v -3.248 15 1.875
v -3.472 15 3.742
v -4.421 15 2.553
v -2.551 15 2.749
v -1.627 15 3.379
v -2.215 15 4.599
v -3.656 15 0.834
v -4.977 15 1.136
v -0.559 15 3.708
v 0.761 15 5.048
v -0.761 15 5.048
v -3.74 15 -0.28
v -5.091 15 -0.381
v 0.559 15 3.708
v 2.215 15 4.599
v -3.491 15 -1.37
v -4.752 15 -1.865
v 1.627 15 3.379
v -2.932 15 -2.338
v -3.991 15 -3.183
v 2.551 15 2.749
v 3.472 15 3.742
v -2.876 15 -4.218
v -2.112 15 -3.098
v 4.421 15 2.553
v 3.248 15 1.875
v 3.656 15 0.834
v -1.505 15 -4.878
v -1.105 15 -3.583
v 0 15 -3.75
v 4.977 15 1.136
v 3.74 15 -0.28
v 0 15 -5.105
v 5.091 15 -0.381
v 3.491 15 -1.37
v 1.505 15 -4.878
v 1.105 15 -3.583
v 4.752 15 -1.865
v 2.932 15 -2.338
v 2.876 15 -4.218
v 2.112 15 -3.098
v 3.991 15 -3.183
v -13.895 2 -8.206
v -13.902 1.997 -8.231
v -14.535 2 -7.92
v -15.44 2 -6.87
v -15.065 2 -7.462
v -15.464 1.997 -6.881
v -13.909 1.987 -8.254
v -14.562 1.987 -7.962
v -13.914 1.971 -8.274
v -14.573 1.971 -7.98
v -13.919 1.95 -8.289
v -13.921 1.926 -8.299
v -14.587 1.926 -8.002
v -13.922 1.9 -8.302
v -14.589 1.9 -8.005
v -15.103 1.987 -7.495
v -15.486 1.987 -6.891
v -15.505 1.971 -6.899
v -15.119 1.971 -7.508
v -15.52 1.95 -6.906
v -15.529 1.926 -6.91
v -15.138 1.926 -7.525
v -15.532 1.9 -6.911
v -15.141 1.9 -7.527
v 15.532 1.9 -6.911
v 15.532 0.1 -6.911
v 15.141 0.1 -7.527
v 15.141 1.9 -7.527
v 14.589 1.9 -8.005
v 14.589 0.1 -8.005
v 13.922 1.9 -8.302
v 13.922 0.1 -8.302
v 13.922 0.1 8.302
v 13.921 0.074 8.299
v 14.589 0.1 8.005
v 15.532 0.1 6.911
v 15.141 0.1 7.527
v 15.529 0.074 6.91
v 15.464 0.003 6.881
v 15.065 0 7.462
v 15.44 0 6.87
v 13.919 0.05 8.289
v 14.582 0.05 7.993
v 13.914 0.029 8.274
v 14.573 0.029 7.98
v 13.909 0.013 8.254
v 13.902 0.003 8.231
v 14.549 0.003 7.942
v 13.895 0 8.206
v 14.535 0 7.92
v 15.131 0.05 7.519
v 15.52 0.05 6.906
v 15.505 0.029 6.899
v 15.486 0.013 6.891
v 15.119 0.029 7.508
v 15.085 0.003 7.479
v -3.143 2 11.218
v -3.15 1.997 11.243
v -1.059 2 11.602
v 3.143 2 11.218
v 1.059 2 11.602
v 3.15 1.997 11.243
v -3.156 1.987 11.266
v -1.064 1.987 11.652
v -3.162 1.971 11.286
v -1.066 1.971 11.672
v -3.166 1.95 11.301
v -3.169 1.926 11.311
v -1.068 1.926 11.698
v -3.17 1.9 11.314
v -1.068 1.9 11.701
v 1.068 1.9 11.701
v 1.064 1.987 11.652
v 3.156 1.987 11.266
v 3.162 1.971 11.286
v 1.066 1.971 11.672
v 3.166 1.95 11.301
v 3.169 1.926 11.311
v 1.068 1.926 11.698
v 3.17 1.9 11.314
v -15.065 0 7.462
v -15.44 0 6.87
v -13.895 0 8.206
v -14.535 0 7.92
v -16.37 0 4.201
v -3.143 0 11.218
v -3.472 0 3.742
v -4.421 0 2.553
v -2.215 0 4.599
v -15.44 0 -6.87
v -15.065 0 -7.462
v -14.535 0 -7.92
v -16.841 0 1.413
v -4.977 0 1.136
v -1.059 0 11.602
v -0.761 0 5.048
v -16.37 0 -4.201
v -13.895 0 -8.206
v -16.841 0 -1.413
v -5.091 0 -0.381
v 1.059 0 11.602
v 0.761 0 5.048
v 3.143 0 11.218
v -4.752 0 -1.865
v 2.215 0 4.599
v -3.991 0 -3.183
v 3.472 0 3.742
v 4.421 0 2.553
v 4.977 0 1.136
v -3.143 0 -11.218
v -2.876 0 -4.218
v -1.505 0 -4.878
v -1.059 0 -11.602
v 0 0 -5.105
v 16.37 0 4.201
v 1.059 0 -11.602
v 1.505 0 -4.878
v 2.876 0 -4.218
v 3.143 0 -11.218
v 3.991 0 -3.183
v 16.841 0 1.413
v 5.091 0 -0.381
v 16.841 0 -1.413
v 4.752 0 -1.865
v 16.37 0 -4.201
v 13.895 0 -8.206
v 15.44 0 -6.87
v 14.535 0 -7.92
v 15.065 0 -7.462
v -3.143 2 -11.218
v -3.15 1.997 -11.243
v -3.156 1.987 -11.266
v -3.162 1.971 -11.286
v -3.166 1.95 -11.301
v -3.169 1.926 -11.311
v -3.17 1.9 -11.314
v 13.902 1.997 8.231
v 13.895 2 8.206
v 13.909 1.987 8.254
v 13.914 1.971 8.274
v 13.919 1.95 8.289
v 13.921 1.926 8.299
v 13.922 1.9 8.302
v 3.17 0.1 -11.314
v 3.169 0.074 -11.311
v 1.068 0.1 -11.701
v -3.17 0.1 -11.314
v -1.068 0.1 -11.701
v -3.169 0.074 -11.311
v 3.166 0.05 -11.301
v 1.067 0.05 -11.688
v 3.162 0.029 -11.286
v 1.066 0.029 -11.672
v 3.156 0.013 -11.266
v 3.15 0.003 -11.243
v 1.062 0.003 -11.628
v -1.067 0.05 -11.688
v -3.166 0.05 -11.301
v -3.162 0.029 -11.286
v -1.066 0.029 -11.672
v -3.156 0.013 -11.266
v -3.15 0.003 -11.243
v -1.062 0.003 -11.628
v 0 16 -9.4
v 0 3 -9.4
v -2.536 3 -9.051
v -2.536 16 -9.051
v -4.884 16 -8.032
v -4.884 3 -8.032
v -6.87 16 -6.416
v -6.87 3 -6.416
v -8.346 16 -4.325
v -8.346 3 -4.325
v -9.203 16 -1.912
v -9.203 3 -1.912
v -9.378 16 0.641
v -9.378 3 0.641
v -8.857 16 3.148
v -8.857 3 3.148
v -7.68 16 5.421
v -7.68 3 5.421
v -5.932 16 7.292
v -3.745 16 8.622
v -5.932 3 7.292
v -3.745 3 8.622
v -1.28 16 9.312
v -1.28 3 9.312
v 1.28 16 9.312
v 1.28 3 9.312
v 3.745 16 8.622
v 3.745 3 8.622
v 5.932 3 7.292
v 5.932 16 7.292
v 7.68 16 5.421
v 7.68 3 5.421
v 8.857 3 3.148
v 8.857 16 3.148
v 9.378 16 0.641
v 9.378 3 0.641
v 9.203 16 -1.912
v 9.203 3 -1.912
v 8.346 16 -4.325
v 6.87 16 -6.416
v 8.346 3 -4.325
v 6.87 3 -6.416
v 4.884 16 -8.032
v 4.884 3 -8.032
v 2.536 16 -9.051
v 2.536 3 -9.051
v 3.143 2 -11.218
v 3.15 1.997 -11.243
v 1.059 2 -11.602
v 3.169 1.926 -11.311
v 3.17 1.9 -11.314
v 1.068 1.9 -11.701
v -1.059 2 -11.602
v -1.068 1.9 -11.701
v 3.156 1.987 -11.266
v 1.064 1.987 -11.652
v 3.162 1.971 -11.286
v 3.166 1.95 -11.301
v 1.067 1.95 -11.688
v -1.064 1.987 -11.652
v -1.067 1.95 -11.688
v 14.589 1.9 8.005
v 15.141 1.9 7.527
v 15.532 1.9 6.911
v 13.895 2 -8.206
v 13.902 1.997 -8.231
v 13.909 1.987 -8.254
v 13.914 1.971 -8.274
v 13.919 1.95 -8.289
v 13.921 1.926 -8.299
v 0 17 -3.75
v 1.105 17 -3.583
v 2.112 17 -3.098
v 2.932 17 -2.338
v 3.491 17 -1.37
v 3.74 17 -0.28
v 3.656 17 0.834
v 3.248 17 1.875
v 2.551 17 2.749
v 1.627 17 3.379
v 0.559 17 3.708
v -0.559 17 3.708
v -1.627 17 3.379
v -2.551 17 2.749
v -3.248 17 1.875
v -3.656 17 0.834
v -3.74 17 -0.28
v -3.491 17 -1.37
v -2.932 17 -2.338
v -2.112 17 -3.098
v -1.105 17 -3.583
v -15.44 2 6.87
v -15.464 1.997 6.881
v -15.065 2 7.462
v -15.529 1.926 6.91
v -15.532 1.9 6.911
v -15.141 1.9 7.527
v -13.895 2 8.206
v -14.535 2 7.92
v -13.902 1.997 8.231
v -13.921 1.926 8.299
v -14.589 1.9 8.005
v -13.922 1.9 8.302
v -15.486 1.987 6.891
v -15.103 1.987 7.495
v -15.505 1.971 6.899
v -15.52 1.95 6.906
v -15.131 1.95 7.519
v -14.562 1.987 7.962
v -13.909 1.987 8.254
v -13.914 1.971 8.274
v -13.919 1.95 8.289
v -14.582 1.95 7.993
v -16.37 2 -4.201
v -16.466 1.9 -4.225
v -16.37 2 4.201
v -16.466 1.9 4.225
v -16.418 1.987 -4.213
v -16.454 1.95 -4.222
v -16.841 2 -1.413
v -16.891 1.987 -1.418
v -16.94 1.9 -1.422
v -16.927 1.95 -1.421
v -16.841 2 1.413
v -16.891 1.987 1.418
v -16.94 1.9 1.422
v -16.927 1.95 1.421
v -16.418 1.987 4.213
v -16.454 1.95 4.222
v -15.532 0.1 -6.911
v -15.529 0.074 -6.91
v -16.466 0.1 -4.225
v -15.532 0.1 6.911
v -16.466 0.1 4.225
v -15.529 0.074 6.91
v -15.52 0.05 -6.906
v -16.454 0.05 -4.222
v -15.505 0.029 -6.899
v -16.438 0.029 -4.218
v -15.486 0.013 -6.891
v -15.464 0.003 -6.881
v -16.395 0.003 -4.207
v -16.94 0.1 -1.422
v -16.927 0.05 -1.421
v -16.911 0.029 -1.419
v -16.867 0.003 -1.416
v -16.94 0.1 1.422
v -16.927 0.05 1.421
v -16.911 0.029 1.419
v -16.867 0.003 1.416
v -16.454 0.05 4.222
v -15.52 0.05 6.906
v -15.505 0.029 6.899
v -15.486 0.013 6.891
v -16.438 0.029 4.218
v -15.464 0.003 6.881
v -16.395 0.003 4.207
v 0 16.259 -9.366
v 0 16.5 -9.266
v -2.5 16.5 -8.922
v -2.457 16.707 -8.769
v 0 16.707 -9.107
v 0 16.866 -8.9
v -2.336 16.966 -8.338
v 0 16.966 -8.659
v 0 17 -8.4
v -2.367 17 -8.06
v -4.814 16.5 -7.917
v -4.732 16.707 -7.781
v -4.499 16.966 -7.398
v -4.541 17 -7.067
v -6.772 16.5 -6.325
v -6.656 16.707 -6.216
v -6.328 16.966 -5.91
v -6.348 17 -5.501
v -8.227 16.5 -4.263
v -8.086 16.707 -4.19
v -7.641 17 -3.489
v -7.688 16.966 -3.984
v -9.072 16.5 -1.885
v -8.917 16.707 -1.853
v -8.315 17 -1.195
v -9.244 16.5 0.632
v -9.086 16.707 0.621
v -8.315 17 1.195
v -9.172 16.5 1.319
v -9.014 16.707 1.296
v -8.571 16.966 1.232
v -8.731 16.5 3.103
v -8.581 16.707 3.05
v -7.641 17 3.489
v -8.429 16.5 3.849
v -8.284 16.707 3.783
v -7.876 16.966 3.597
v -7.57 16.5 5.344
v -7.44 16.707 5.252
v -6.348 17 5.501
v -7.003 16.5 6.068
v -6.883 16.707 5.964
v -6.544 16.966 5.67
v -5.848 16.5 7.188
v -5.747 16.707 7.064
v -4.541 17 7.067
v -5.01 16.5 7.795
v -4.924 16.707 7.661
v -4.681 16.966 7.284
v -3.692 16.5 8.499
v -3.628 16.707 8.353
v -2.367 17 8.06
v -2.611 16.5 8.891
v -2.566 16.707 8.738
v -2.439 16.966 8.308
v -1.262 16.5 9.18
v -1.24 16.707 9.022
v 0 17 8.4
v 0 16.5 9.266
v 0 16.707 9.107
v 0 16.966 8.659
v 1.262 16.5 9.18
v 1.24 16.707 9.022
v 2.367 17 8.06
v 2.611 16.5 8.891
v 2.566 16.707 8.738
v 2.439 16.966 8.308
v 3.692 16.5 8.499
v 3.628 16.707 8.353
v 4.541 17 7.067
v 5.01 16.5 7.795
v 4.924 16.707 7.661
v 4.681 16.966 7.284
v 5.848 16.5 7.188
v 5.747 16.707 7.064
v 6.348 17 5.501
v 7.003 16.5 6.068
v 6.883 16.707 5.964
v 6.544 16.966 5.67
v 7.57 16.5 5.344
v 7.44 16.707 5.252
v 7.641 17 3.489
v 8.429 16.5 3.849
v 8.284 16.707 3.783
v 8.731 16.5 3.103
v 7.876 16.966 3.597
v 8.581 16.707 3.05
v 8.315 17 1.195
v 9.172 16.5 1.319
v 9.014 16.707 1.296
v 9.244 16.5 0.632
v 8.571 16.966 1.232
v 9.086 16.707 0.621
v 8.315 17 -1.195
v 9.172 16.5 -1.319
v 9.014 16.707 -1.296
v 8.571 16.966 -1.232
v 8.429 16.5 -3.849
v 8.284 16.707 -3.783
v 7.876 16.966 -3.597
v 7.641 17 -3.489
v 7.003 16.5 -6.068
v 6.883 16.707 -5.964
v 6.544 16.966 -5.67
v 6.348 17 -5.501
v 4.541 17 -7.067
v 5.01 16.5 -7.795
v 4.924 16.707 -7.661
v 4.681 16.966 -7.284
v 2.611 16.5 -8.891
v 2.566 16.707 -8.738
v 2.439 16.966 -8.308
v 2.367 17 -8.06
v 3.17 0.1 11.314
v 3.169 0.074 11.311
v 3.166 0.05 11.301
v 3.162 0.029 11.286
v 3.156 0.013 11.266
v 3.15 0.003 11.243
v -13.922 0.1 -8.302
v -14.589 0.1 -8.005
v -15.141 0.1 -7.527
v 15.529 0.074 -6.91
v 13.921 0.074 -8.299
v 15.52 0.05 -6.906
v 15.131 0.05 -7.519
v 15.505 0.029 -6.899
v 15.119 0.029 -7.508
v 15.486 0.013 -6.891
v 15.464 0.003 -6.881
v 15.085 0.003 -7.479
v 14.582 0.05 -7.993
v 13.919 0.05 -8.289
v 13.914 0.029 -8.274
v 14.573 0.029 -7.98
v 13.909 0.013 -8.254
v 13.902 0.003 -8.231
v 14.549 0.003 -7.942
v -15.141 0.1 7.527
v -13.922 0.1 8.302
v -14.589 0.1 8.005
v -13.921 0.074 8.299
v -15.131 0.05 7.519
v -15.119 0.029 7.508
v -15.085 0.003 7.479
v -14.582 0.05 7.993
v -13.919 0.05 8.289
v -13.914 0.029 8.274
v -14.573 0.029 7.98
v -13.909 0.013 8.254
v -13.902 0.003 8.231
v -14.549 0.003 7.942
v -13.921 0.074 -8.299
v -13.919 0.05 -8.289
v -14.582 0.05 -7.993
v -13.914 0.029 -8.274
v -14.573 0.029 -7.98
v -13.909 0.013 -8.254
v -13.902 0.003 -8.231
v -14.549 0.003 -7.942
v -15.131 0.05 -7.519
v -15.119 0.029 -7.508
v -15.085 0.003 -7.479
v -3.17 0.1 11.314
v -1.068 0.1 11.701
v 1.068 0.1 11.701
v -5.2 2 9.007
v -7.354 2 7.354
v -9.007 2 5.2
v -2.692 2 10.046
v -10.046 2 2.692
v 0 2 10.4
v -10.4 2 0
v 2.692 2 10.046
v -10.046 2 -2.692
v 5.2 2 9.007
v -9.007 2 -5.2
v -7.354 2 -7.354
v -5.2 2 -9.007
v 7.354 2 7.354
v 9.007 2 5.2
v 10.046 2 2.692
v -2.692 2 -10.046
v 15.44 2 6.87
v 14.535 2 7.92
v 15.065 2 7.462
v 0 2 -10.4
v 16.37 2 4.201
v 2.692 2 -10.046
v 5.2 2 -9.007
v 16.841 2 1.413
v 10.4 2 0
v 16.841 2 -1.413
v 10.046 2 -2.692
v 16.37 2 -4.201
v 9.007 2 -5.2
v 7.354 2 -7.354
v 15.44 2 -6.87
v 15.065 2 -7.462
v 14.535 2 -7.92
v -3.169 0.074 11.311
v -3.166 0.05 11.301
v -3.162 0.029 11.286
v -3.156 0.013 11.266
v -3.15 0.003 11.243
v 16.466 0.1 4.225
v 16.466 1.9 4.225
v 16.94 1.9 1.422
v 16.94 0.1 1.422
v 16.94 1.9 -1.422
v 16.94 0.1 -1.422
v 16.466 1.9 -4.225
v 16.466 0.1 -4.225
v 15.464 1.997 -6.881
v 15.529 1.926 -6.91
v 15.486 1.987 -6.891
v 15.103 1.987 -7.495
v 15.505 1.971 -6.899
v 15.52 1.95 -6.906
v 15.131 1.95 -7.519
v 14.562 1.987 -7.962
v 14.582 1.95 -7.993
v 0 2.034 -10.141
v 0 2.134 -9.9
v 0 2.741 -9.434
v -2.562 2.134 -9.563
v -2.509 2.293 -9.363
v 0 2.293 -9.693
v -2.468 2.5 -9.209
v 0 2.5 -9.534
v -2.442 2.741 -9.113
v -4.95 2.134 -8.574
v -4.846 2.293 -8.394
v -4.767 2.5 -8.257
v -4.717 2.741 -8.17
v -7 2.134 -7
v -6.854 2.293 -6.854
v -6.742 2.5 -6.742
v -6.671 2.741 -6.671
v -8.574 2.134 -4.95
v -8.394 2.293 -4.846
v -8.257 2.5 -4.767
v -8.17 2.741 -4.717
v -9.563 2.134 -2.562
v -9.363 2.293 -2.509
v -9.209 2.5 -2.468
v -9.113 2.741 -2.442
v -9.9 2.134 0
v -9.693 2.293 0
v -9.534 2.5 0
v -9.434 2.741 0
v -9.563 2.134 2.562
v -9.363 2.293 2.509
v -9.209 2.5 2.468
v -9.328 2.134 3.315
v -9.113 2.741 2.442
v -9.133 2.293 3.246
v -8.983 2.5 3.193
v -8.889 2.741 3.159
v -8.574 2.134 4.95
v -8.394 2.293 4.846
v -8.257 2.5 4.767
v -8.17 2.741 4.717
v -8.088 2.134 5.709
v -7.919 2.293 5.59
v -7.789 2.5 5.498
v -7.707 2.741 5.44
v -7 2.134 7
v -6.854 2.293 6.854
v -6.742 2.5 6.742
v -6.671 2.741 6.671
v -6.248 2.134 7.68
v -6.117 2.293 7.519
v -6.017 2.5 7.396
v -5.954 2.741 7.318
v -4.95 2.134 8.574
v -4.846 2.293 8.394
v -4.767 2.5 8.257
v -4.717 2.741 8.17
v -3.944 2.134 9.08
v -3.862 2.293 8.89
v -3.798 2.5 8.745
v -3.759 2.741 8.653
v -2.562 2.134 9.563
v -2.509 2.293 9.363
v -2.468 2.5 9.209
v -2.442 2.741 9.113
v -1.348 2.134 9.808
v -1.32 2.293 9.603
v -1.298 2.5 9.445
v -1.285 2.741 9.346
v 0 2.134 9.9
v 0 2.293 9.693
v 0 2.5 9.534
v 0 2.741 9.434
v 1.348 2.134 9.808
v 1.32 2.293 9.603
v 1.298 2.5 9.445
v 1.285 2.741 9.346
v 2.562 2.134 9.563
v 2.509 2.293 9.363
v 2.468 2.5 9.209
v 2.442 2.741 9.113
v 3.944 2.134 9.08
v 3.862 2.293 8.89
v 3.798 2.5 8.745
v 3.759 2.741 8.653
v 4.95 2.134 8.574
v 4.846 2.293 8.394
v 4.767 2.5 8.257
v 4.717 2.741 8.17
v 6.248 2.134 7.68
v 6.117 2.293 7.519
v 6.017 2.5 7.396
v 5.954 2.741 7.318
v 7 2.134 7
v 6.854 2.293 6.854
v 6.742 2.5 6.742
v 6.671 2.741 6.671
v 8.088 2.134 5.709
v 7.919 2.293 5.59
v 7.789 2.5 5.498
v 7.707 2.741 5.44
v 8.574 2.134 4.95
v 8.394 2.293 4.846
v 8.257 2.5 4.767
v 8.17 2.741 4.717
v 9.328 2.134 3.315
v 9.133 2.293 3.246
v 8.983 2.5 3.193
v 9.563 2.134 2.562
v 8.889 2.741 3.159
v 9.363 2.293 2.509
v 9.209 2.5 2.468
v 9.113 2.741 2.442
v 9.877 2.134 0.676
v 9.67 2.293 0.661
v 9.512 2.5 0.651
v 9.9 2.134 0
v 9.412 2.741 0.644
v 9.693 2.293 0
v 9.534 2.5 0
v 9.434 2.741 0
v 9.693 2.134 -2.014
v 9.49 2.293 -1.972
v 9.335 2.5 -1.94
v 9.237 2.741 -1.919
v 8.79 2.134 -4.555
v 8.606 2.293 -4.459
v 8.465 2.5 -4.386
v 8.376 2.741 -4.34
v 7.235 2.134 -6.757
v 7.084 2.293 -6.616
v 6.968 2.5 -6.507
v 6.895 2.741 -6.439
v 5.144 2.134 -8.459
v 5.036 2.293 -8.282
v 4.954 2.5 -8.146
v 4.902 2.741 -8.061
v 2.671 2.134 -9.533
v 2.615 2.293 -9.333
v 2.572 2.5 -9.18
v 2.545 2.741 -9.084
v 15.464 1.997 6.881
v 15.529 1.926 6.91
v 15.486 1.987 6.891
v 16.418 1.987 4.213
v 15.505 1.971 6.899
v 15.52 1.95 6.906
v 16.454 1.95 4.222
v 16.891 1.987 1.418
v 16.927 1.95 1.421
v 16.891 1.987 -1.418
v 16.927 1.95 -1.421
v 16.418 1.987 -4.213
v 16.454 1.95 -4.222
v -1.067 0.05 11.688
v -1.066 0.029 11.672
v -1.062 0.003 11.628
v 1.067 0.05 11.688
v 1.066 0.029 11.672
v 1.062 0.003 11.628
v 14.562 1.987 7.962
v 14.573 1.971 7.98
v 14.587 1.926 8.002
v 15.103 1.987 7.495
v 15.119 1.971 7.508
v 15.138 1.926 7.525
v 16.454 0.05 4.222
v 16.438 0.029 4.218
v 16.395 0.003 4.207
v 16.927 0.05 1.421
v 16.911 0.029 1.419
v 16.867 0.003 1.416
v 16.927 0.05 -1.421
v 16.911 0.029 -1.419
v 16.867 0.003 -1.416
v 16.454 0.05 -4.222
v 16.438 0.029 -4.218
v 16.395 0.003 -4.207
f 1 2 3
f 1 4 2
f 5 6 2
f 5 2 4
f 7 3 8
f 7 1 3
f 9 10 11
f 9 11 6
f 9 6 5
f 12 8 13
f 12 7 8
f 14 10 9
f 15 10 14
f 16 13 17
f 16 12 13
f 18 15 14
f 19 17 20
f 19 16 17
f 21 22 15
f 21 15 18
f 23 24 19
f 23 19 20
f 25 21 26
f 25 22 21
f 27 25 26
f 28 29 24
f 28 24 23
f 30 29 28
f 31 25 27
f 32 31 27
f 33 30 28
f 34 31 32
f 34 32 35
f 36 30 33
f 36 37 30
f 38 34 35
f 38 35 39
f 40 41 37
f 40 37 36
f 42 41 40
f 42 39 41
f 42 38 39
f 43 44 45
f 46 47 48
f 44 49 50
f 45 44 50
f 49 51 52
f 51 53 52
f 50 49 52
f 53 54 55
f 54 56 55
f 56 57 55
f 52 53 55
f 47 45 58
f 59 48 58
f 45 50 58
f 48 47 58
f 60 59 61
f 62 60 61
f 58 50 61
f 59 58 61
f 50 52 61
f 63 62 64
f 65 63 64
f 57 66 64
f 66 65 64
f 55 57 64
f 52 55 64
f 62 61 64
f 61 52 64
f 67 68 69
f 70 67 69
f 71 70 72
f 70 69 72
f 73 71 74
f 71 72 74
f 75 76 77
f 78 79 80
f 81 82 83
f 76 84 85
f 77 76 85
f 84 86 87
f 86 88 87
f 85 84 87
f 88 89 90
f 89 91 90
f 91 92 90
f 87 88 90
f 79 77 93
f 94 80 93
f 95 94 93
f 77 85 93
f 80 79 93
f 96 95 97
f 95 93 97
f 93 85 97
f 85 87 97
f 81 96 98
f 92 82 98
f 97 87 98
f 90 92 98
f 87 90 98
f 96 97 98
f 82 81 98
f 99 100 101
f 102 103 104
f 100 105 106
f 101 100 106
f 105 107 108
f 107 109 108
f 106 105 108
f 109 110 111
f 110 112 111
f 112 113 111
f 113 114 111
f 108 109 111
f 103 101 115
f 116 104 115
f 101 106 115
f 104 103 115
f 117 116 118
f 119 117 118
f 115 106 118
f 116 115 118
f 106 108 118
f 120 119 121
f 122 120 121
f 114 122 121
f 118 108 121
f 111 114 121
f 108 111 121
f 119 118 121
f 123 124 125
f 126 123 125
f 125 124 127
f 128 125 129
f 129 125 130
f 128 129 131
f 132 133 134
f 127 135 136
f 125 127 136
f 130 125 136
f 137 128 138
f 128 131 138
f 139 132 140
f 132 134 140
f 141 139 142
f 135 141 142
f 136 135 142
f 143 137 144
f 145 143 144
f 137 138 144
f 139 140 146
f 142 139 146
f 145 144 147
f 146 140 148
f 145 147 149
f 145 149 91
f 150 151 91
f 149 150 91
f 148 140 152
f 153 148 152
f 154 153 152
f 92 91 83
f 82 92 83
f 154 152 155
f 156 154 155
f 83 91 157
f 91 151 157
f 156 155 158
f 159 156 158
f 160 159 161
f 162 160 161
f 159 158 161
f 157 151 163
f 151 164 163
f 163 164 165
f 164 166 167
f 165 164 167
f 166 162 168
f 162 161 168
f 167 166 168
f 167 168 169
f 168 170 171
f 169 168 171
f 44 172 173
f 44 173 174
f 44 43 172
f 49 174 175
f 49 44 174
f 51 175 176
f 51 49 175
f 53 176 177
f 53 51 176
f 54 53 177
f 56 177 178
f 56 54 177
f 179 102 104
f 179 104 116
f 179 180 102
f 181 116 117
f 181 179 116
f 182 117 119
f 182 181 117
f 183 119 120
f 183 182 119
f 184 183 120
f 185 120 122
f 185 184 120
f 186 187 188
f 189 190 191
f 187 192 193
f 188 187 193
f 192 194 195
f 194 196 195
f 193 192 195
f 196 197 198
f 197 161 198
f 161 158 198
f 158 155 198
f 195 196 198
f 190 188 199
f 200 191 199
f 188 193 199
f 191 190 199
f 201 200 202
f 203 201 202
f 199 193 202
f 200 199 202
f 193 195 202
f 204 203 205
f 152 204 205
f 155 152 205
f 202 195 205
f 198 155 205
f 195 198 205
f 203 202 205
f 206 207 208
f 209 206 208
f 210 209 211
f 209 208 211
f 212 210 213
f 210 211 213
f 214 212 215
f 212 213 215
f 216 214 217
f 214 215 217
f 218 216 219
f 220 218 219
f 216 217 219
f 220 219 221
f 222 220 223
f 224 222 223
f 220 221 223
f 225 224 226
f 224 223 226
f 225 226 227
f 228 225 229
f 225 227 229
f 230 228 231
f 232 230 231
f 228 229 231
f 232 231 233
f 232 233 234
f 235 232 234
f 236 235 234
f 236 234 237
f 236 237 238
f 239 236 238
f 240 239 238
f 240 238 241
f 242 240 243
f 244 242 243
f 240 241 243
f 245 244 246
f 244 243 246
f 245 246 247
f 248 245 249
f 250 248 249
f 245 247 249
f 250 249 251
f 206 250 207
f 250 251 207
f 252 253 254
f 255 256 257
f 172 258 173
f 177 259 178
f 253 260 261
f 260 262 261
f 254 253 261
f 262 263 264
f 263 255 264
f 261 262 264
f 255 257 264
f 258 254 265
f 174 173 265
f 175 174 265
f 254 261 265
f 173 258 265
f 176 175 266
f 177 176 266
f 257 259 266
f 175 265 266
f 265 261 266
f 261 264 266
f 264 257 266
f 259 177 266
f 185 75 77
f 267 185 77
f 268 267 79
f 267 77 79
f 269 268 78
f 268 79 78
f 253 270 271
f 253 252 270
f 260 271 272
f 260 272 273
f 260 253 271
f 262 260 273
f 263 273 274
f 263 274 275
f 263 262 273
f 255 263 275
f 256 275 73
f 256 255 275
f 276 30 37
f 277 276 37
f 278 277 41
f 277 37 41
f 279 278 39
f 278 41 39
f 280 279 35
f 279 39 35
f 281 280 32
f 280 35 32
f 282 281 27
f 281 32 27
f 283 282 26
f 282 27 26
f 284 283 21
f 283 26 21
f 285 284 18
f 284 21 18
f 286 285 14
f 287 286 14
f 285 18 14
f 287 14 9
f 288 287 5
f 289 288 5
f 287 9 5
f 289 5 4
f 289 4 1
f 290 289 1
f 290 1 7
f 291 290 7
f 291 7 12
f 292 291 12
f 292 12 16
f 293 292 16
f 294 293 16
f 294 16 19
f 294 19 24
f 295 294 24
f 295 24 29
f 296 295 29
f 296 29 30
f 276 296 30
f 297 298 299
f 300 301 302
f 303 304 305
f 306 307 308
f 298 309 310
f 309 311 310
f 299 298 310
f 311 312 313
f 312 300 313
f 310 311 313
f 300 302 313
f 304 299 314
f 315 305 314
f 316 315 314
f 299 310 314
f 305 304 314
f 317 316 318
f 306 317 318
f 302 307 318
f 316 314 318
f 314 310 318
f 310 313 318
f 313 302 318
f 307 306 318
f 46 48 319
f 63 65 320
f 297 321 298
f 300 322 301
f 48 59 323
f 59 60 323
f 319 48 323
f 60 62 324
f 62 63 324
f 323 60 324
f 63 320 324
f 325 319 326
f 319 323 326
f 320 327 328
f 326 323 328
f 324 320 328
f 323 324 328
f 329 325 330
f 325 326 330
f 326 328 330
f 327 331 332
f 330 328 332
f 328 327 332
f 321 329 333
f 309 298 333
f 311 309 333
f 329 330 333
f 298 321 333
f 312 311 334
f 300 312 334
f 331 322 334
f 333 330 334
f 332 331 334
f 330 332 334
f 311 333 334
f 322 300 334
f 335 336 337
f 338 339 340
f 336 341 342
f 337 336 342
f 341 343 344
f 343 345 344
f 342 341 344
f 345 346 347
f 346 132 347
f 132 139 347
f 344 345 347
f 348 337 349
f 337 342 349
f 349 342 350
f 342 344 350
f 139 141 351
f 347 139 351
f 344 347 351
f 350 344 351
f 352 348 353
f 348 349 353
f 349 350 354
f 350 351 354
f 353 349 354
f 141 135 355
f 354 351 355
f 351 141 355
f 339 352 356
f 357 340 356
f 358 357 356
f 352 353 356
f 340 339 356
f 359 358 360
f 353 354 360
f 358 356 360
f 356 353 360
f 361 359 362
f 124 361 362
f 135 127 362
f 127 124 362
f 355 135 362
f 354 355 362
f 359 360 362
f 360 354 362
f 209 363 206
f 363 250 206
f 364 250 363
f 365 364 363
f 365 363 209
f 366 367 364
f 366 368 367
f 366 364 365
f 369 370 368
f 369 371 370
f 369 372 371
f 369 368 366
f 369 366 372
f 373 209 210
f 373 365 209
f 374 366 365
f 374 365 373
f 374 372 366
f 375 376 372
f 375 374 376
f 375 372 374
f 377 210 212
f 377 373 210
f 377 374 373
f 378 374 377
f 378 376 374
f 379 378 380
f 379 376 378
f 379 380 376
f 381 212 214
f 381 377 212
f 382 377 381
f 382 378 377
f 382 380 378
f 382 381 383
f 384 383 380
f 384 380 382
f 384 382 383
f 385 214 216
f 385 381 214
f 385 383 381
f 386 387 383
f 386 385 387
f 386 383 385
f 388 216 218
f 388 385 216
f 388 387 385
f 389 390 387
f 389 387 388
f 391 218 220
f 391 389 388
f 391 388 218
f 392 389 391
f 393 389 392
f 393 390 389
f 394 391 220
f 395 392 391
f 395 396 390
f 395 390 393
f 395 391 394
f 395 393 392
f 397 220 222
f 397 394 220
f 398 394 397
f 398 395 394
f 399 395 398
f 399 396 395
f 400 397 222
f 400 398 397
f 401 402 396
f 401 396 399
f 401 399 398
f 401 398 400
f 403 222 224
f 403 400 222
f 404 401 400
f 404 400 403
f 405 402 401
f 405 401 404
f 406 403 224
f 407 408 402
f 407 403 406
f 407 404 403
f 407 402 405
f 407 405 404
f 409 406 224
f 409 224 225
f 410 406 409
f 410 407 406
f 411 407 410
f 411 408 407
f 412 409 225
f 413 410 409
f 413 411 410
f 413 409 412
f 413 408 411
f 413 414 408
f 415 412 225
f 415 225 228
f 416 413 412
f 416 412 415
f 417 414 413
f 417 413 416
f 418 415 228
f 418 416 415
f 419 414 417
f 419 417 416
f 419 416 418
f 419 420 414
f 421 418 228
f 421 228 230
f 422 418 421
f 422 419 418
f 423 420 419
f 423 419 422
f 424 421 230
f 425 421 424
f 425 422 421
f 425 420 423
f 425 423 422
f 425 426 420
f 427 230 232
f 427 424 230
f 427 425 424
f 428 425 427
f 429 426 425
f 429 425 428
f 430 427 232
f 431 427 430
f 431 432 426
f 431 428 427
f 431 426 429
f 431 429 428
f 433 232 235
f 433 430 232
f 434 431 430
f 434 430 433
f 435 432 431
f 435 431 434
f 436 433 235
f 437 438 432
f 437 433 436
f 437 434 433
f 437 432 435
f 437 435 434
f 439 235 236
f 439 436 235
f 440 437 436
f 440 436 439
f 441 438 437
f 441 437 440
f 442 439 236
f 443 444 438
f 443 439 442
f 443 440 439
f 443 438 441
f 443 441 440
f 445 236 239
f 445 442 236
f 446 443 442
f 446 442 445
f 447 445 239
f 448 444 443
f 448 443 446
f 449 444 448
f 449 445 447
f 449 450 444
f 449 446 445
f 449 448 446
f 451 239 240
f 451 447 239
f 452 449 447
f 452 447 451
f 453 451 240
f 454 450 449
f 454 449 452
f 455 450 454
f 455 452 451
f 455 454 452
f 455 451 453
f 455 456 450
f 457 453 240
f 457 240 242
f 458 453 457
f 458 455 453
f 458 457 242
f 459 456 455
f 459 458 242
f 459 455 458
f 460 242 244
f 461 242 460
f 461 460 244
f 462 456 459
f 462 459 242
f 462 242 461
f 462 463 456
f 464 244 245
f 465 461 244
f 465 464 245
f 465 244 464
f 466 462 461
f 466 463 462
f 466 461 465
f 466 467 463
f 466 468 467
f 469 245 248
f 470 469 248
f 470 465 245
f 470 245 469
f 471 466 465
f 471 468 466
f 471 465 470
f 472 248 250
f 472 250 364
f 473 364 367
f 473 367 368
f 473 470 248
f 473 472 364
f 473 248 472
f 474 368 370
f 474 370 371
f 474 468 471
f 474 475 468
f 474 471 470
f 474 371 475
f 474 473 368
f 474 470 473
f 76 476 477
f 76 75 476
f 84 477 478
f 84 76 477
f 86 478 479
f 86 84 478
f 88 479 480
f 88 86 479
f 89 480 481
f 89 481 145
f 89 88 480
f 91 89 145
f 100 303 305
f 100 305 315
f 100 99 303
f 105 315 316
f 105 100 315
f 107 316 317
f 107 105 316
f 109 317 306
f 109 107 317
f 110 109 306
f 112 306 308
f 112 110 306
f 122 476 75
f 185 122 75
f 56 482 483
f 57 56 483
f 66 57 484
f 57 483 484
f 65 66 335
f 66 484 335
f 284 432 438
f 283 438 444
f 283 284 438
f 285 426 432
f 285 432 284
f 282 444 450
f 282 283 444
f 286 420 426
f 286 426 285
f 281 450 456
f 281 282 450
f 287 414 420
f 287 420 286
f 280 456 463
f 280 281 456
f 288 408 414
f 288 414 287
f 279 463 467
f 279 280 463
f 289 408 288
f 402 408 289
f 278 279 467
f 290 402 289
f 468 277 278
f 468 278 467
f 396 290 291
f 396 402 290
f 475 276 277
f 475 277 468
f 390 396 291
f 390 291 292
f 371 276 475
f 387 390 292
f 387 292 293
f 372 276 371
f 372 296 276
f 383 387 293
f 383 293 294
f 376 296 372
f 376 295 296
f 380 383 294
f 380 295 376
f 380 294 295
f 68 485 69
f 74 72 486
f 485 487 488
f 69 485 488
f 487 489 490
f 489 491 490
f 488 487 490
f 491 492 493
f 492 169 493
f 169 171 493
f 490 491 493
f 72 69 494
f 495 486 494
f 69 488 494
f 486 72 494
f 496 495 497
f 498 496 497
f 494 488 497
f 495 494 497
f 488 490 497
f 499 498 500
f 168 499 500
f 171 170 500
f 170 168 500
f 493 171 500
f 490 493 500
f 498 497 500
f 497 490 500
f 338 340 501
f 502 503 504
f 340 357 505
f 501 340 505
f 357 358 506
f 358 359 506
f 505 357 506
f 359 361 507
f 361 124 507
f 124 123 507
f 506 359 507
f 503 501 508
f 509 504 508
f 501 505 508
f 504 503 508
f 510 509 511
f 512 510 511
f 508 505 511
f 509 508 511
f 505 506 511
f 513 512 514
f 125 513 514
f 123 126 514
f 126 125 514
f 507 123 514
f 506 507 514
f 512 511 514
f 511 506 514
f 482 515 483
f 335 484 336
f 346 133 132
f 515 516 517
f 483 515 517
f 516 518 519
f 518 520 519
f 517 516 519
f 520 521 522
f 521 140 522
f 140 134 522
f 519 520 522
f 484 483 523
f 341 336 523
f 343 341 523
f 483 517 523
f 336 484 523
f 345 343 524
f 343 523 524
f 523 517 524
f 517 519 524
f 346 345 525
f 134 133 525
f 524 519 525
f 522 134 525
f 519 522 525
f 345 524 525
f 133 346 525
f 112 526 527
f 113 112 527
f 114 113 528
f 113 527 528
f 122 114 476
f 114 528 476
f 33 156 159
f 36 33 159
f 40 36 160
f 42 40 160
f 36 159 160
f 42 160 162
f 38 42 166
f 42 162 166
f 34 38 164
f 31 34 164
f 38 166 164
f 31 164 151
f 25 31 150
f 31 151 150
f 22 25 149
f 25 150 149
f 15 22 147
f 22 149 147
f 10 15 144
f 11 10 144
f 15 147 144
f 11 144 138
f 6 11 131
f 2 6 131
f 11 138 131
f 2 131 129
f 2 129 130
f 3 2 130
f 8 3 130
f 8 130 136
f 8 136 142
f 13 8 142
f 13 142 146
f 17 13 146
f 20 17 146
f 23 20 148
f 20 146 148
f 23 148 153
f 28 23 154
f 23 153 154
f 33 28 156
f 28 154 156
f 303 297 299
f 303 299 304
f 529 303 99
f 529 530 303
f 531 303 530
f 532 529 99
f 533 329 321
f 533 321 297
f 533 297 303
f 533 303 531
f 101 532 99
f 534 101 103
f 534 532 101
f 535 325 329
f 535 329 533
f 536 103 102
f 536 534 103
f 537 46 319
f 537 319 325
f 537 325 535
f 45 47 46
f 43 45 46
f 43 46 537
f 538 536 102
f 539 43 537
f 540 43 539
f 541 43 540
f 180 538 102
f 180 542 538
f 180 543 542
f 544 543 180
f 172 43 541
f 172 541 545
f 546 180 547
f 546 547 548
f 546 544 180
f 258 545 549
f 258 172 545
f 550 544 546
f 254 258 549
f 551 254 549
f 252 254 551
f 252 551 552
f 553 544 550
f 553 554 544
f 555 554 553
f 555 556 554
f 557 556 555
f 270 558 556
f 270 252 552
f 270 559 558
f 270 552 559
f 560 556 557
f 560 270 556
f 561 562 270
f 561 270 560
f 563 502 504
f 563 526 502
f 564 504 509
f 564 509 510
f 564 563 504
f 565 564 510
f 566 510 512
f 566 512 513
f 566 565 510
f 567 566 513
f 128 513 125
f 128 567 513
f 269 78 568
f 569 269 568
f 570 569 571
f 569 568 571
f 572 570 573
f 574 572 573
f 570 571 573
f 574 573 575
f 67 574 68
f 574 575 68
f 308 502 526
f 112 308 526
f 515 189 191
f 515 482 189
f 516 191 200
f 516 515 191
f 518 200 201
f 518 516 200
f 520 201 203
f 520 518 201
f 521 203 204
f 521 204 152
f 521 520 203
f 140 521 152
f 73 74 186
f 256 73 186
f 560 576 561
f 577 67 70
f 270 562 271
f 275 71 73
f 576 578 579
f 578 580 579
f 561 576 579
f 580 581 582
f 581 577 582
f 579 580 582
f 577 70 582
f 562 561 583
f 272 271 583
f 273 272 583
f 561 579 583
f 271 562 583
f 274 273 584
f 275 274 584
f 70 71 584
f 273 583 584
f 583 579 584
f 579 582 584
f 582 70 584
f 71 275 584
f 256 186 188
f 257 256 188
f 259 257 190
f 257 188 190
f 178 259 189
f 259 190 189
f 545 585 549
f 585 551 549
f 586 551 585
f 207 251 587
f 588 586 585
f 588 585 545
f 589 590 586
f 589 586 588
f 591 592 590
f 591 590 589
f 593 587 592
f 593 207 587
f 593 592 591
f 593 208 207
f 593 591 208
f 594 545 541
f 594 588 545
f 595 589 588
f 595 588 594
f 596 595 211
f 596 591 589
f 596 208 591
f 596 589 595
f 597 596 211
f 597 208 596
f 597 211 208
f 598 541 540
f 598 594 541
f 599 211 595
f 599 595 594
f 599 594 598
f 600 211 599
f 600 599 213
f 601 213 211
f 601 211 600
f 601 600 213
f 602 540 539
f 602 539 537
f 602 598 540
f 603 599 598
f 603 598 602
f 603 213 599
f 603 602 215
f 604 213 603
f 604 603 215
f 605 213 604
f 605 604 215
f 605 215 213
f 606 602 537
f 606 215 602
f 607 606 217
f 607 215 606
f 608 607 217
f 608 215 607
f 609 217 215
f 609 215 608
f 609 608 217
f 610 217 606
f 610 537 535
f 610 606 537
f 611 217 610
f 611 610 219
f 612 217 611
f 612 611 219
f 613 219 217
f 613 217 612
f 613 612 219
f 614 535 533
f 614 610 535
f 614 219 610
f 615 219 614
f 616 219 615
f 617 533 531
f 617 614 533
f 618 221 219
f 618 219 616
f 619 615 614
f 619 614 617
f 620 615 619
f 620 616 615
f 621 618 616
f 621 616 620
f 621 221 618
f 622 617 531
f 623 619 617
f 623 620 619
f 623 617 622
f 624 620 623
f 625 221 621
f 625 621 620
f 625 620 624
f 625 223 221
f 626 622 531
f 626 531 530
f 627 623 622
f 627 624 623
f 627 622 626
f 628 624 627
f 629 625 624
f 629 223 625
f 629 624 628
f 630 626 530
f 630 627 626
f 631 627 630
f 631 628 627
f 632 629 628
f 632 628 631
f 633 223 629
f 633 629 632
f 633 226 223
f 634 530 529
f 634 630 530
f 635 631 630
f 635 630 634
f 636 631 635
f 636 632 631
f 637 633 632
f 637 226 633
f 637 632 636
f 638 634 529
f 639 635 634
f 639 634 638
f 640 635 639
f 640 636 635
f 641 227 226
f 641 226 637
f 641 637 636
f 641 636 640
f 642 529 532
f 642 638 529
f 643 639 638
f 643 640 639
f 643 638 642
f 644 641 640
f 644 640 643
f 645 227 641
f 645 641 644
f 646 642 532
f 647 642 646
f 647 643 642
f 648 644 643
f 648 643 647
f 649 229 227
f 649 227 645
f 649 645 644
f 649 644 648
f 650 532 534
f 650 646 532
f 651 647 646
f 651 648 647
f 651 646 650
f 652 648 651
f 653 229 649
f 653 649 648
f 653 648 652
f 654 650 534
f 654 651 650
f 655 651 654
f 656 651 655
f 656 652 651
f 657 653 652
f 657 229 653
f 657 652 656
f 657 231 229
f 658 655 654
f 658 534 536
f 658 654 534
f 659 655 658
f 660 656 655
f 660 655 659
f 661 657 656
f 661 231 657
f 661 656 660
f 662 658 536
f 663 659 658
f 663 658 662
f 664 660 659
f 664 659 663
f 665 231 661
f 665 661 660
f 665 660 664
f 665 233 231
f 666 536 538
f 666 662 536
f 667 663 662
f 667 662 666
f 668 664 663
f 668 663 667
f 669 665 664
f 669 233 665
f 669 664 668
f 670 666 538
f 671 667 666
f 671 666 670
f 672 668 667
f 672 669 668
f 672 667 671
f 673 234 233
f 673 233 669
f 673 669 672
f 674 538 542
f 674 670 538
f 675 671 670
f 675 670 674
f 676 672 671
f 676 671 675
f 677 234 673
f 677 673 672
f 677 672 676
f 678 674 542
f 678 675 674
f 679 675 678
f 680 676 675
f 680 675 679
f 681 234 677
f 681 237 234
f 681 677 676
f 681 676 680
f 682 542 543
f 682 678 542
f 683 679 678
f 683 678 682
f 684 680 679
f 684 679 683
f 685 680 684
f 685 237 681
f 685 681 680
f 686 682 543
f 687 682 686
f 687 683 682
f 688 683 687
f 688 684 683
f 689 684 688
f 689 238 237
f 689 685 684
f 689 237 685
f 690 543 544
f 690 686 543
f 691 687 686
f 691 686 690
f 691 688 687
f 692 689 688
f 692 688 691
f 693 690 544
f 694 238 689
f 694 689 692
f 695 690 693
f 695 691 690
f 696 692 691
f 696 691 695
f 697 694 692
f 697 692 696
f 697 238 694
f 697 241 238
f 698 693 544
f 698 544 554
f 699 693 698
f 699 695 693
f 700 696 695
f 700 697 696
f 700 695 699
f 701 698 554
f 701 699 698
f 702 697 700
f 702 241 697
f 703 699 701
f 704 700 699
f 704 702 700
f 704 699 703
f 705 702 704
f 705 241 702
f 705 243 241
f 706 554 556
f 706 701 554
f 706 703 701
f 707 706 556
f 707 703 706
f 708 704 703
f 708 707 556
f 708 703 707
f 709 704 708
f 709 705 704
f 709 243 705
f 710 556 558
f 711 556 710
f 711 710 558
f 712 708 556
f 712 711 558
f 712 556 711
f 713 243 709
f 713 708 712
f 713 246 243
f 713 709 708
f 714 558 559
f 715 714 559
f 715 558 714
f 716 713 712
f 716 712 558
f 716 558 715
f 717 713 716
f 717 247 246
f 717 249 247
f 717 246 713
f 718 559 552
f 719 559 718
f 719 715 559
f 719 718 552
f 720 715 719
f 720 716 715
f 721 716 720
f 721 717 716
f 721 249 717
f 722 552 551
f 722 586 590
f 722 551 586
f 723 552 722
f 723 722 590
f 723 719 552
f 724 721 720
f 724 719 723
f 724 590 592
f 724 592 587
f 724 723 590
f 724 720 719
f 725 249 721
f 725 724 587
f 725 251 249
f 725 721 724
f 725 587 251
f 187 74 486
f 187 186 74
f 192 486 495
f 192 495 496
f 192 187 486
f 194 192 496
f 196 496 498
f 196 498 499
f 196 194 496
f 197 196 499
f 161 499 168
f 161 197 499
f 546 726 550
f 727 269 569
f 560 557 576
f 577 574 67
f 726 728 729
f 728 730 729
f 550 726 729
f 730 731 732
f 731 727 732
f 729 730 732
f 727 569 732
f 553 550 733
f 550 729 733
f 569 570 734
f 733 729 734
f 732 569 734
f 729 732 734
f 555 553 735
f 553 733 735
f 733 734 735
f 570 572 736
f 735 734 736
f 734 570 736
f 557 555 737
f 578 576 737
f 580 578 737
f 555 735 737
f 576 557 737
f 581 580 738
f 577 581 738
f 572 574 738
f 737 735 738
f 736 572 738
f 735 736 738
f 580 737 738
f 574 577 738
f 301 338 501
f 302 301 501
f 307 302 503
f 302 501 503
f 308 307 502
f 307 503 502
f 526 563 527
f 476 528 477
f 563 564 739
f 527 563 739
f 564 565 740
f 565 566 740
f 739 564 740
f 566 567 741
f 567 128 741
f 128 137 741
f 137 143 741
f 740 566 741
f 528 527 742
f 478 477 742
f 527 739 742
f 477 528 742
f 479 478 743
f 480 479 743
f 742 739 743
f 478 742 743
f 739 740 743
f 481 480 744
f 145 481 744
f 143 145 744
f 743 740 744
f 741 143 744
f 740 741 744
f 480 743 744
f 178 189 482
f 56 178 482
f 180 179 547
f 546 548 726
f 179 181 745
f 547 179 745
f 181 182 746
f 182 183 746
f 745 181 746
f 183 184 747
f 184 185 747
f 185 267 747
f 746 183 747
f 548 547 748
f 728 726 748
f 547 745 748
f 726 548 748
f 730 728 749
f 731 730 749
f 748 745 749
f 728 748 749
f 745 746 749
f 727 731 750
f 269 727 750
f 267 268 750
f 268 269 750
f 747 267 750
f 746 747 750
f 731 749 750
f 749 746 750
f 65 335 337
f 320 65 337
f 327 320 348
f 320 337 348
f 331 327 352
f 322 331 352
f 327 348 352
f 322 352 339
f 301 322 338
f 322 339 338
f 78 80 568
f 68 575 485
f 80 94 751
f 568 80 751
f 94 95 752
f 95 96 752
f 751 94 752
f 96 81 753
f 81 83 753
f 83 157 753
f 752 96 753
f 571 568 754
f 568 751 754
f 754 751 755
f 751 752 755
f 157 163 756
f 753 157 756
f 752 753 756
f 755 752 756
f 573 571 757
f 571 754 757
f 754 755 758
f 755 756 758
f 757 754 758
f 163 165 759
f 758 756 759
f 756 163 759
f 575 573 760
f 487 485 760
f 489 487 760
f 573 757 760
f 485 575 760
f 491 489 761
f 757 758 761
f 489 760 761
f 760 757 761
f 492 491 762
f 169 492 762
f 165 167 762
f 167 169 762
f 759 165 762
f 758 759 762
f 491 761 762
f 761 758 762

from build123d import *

# Parameters (mm, degrees)
BOSS_EXTRUDE3_DEPTH = 2
SKETCH2_R           = 9.4
BOSS_EXTRUDE2_DEPTH = 15
SKETCH3_R           = 5.105
CUT_EXTRUDE1_DEPTH  = 15
SKETCH4_R           = 3.75
CUT_EXTRUDE2_DEPTH  = 26.535514485
FILLET2_R           = 1
FILLET4_R           = 0.1


with BuildPart() as part:
    # Sketch6 → Boss-Extrude3 (new body)
    with BuildSketch(Plane(origin=(0, 0, 0), x_dir=(1, 0, 0), z_dir=(0, 1, 0))):
        with BuildLine():
            Line((-3.16984511, 11.314352919), (-13.922193144, 8.301959893))
            ThreePointArc((-13.922193144, 8.301959893), (-14.882365074, 7.78622676), (-15.531854224, 6.910969857))
            ThreePointArc((-15.531854224, 6.910969857), (-17, 0), (-15.531854224, -6.910969857))
            ThreePointArc((-15.531854224, -6.910969857), (-14.882365074, -7.78622676), (-13.922193144, -8.301959893))
            Line((-13.922193144, -8.301959893), (-3.16984511, -11.314352919))
            ThreePointArc((-3.16984511, -11.314352919), (0, -11.75), (3.16984511, -11.314352919))
            Line((3.16984511, -11.314352919), (13.922193144, -8.301959893))
            ThreePointArc((13.922193144, -8.301959893), (14.882365074, -7.78622676), (15.531854224, -6.910969857))
            ThreePointArc((15.531854224, -6.910969857), (17, 0), (15.531854224, 6.910969857))
            ThreePointArc((15.531854224, 6.910969857), (14.882365074, 7.78622676), (13.922193144, 8.301959893))
            Line((13.922193144, 8.301959893), (3.16984511, 11.314352919))
            ThreePointArc((3.16984511, 11.314352919), (0, 11.75), (-3.16984511, 11.314352919))
        make_face()
    extrude(amount=BOSS_EXTRUDE3_DEPTH)

    # Sketch2 → Boss-Extrude2 (add)
    with BuildSketch(Plane(origin=(0, 2, 0), x_dir=(1, 0, 0), z_dir=(0, 1, 0))):
        with Locations(Location((0, 0, 0), (0, 0, 90))):
            Circle(SKETCH2_R)
    extrude(amount=BOSS_EXTRUDE2_DEPTH)

    # Sketch3 → Cut-Extrude1 (cut)
    with BuildSketch(Plane.XZ):
        with Locations(Location((0, 0, 0), (0, 0, 270))):
            Circle(SKETCH3_R)
    extrude(amount=-CUT_EXTRUDE1_DEPTH, mode=Mode.SUBTRACT)

    # Sketch4 → Cut-Extrude2 (cut, through all)
    with BuildSketch(Plane.XZ.offset(-15)):
        with Locations(Location((0, 0, 0), (0, 0, 270))):
            Circle(SKETCH4_R)
    extrude(amount=-CUT_EXTRUDE2_DEPTH, mode=Mode.SUBTRACT)

    # Fillet2
    fillet2_edges = [part.edges().sort_by_distance(p)[0] for p in [
        (0, 2, 9.4),
        (0, 17, 9.4),
    ]]
    fillet(fillet2_edges, radius=FILLET2_R)

    # Fillet4
    fillet4_edges = [part.edges().sort_by_distance(p)[0] for p in [
        (0, 2, -11.75),
        (17, 0, 0),
        (14.882365074, 0, 7.78622676),
        (8.546019127, 0, 9.808156406),
        (0, 0, 11.75),
        (-8.546019127, 0, 9.808156406),
        (-14.882365074, 0, 7.78622676),
        (-8.546019127, 2, -9.808156406),
        (-17, 0, 0),
        (-14.882365074, 0, -7.78622676),
        (-8.546019127, 0, -9.808156406),
        (0, 0, -11.75),
        (8.546019127, 0, -9.808156406),
        (14.882365074, 0, -7.78622676),
        (-14.882365074, 2, -7.78622676),
        (-17, 2, 0),
        (-14.882365074, 2, 7.78622676),
        (-8.546019127, 2, 9.808156406),
        (0, 2, 11.75),
        (8.546019127, 2, 9.808156406),
        (14.882365074, 2, 7.78622676),
        (17, 2, 0),
        (14.882365074, 2, -7.78622676),
        (8.546019127, 2, -9.808156406),
    ]]
    fillet(fillet4_edges, radius=FILLET4_R)


solid = part.part
